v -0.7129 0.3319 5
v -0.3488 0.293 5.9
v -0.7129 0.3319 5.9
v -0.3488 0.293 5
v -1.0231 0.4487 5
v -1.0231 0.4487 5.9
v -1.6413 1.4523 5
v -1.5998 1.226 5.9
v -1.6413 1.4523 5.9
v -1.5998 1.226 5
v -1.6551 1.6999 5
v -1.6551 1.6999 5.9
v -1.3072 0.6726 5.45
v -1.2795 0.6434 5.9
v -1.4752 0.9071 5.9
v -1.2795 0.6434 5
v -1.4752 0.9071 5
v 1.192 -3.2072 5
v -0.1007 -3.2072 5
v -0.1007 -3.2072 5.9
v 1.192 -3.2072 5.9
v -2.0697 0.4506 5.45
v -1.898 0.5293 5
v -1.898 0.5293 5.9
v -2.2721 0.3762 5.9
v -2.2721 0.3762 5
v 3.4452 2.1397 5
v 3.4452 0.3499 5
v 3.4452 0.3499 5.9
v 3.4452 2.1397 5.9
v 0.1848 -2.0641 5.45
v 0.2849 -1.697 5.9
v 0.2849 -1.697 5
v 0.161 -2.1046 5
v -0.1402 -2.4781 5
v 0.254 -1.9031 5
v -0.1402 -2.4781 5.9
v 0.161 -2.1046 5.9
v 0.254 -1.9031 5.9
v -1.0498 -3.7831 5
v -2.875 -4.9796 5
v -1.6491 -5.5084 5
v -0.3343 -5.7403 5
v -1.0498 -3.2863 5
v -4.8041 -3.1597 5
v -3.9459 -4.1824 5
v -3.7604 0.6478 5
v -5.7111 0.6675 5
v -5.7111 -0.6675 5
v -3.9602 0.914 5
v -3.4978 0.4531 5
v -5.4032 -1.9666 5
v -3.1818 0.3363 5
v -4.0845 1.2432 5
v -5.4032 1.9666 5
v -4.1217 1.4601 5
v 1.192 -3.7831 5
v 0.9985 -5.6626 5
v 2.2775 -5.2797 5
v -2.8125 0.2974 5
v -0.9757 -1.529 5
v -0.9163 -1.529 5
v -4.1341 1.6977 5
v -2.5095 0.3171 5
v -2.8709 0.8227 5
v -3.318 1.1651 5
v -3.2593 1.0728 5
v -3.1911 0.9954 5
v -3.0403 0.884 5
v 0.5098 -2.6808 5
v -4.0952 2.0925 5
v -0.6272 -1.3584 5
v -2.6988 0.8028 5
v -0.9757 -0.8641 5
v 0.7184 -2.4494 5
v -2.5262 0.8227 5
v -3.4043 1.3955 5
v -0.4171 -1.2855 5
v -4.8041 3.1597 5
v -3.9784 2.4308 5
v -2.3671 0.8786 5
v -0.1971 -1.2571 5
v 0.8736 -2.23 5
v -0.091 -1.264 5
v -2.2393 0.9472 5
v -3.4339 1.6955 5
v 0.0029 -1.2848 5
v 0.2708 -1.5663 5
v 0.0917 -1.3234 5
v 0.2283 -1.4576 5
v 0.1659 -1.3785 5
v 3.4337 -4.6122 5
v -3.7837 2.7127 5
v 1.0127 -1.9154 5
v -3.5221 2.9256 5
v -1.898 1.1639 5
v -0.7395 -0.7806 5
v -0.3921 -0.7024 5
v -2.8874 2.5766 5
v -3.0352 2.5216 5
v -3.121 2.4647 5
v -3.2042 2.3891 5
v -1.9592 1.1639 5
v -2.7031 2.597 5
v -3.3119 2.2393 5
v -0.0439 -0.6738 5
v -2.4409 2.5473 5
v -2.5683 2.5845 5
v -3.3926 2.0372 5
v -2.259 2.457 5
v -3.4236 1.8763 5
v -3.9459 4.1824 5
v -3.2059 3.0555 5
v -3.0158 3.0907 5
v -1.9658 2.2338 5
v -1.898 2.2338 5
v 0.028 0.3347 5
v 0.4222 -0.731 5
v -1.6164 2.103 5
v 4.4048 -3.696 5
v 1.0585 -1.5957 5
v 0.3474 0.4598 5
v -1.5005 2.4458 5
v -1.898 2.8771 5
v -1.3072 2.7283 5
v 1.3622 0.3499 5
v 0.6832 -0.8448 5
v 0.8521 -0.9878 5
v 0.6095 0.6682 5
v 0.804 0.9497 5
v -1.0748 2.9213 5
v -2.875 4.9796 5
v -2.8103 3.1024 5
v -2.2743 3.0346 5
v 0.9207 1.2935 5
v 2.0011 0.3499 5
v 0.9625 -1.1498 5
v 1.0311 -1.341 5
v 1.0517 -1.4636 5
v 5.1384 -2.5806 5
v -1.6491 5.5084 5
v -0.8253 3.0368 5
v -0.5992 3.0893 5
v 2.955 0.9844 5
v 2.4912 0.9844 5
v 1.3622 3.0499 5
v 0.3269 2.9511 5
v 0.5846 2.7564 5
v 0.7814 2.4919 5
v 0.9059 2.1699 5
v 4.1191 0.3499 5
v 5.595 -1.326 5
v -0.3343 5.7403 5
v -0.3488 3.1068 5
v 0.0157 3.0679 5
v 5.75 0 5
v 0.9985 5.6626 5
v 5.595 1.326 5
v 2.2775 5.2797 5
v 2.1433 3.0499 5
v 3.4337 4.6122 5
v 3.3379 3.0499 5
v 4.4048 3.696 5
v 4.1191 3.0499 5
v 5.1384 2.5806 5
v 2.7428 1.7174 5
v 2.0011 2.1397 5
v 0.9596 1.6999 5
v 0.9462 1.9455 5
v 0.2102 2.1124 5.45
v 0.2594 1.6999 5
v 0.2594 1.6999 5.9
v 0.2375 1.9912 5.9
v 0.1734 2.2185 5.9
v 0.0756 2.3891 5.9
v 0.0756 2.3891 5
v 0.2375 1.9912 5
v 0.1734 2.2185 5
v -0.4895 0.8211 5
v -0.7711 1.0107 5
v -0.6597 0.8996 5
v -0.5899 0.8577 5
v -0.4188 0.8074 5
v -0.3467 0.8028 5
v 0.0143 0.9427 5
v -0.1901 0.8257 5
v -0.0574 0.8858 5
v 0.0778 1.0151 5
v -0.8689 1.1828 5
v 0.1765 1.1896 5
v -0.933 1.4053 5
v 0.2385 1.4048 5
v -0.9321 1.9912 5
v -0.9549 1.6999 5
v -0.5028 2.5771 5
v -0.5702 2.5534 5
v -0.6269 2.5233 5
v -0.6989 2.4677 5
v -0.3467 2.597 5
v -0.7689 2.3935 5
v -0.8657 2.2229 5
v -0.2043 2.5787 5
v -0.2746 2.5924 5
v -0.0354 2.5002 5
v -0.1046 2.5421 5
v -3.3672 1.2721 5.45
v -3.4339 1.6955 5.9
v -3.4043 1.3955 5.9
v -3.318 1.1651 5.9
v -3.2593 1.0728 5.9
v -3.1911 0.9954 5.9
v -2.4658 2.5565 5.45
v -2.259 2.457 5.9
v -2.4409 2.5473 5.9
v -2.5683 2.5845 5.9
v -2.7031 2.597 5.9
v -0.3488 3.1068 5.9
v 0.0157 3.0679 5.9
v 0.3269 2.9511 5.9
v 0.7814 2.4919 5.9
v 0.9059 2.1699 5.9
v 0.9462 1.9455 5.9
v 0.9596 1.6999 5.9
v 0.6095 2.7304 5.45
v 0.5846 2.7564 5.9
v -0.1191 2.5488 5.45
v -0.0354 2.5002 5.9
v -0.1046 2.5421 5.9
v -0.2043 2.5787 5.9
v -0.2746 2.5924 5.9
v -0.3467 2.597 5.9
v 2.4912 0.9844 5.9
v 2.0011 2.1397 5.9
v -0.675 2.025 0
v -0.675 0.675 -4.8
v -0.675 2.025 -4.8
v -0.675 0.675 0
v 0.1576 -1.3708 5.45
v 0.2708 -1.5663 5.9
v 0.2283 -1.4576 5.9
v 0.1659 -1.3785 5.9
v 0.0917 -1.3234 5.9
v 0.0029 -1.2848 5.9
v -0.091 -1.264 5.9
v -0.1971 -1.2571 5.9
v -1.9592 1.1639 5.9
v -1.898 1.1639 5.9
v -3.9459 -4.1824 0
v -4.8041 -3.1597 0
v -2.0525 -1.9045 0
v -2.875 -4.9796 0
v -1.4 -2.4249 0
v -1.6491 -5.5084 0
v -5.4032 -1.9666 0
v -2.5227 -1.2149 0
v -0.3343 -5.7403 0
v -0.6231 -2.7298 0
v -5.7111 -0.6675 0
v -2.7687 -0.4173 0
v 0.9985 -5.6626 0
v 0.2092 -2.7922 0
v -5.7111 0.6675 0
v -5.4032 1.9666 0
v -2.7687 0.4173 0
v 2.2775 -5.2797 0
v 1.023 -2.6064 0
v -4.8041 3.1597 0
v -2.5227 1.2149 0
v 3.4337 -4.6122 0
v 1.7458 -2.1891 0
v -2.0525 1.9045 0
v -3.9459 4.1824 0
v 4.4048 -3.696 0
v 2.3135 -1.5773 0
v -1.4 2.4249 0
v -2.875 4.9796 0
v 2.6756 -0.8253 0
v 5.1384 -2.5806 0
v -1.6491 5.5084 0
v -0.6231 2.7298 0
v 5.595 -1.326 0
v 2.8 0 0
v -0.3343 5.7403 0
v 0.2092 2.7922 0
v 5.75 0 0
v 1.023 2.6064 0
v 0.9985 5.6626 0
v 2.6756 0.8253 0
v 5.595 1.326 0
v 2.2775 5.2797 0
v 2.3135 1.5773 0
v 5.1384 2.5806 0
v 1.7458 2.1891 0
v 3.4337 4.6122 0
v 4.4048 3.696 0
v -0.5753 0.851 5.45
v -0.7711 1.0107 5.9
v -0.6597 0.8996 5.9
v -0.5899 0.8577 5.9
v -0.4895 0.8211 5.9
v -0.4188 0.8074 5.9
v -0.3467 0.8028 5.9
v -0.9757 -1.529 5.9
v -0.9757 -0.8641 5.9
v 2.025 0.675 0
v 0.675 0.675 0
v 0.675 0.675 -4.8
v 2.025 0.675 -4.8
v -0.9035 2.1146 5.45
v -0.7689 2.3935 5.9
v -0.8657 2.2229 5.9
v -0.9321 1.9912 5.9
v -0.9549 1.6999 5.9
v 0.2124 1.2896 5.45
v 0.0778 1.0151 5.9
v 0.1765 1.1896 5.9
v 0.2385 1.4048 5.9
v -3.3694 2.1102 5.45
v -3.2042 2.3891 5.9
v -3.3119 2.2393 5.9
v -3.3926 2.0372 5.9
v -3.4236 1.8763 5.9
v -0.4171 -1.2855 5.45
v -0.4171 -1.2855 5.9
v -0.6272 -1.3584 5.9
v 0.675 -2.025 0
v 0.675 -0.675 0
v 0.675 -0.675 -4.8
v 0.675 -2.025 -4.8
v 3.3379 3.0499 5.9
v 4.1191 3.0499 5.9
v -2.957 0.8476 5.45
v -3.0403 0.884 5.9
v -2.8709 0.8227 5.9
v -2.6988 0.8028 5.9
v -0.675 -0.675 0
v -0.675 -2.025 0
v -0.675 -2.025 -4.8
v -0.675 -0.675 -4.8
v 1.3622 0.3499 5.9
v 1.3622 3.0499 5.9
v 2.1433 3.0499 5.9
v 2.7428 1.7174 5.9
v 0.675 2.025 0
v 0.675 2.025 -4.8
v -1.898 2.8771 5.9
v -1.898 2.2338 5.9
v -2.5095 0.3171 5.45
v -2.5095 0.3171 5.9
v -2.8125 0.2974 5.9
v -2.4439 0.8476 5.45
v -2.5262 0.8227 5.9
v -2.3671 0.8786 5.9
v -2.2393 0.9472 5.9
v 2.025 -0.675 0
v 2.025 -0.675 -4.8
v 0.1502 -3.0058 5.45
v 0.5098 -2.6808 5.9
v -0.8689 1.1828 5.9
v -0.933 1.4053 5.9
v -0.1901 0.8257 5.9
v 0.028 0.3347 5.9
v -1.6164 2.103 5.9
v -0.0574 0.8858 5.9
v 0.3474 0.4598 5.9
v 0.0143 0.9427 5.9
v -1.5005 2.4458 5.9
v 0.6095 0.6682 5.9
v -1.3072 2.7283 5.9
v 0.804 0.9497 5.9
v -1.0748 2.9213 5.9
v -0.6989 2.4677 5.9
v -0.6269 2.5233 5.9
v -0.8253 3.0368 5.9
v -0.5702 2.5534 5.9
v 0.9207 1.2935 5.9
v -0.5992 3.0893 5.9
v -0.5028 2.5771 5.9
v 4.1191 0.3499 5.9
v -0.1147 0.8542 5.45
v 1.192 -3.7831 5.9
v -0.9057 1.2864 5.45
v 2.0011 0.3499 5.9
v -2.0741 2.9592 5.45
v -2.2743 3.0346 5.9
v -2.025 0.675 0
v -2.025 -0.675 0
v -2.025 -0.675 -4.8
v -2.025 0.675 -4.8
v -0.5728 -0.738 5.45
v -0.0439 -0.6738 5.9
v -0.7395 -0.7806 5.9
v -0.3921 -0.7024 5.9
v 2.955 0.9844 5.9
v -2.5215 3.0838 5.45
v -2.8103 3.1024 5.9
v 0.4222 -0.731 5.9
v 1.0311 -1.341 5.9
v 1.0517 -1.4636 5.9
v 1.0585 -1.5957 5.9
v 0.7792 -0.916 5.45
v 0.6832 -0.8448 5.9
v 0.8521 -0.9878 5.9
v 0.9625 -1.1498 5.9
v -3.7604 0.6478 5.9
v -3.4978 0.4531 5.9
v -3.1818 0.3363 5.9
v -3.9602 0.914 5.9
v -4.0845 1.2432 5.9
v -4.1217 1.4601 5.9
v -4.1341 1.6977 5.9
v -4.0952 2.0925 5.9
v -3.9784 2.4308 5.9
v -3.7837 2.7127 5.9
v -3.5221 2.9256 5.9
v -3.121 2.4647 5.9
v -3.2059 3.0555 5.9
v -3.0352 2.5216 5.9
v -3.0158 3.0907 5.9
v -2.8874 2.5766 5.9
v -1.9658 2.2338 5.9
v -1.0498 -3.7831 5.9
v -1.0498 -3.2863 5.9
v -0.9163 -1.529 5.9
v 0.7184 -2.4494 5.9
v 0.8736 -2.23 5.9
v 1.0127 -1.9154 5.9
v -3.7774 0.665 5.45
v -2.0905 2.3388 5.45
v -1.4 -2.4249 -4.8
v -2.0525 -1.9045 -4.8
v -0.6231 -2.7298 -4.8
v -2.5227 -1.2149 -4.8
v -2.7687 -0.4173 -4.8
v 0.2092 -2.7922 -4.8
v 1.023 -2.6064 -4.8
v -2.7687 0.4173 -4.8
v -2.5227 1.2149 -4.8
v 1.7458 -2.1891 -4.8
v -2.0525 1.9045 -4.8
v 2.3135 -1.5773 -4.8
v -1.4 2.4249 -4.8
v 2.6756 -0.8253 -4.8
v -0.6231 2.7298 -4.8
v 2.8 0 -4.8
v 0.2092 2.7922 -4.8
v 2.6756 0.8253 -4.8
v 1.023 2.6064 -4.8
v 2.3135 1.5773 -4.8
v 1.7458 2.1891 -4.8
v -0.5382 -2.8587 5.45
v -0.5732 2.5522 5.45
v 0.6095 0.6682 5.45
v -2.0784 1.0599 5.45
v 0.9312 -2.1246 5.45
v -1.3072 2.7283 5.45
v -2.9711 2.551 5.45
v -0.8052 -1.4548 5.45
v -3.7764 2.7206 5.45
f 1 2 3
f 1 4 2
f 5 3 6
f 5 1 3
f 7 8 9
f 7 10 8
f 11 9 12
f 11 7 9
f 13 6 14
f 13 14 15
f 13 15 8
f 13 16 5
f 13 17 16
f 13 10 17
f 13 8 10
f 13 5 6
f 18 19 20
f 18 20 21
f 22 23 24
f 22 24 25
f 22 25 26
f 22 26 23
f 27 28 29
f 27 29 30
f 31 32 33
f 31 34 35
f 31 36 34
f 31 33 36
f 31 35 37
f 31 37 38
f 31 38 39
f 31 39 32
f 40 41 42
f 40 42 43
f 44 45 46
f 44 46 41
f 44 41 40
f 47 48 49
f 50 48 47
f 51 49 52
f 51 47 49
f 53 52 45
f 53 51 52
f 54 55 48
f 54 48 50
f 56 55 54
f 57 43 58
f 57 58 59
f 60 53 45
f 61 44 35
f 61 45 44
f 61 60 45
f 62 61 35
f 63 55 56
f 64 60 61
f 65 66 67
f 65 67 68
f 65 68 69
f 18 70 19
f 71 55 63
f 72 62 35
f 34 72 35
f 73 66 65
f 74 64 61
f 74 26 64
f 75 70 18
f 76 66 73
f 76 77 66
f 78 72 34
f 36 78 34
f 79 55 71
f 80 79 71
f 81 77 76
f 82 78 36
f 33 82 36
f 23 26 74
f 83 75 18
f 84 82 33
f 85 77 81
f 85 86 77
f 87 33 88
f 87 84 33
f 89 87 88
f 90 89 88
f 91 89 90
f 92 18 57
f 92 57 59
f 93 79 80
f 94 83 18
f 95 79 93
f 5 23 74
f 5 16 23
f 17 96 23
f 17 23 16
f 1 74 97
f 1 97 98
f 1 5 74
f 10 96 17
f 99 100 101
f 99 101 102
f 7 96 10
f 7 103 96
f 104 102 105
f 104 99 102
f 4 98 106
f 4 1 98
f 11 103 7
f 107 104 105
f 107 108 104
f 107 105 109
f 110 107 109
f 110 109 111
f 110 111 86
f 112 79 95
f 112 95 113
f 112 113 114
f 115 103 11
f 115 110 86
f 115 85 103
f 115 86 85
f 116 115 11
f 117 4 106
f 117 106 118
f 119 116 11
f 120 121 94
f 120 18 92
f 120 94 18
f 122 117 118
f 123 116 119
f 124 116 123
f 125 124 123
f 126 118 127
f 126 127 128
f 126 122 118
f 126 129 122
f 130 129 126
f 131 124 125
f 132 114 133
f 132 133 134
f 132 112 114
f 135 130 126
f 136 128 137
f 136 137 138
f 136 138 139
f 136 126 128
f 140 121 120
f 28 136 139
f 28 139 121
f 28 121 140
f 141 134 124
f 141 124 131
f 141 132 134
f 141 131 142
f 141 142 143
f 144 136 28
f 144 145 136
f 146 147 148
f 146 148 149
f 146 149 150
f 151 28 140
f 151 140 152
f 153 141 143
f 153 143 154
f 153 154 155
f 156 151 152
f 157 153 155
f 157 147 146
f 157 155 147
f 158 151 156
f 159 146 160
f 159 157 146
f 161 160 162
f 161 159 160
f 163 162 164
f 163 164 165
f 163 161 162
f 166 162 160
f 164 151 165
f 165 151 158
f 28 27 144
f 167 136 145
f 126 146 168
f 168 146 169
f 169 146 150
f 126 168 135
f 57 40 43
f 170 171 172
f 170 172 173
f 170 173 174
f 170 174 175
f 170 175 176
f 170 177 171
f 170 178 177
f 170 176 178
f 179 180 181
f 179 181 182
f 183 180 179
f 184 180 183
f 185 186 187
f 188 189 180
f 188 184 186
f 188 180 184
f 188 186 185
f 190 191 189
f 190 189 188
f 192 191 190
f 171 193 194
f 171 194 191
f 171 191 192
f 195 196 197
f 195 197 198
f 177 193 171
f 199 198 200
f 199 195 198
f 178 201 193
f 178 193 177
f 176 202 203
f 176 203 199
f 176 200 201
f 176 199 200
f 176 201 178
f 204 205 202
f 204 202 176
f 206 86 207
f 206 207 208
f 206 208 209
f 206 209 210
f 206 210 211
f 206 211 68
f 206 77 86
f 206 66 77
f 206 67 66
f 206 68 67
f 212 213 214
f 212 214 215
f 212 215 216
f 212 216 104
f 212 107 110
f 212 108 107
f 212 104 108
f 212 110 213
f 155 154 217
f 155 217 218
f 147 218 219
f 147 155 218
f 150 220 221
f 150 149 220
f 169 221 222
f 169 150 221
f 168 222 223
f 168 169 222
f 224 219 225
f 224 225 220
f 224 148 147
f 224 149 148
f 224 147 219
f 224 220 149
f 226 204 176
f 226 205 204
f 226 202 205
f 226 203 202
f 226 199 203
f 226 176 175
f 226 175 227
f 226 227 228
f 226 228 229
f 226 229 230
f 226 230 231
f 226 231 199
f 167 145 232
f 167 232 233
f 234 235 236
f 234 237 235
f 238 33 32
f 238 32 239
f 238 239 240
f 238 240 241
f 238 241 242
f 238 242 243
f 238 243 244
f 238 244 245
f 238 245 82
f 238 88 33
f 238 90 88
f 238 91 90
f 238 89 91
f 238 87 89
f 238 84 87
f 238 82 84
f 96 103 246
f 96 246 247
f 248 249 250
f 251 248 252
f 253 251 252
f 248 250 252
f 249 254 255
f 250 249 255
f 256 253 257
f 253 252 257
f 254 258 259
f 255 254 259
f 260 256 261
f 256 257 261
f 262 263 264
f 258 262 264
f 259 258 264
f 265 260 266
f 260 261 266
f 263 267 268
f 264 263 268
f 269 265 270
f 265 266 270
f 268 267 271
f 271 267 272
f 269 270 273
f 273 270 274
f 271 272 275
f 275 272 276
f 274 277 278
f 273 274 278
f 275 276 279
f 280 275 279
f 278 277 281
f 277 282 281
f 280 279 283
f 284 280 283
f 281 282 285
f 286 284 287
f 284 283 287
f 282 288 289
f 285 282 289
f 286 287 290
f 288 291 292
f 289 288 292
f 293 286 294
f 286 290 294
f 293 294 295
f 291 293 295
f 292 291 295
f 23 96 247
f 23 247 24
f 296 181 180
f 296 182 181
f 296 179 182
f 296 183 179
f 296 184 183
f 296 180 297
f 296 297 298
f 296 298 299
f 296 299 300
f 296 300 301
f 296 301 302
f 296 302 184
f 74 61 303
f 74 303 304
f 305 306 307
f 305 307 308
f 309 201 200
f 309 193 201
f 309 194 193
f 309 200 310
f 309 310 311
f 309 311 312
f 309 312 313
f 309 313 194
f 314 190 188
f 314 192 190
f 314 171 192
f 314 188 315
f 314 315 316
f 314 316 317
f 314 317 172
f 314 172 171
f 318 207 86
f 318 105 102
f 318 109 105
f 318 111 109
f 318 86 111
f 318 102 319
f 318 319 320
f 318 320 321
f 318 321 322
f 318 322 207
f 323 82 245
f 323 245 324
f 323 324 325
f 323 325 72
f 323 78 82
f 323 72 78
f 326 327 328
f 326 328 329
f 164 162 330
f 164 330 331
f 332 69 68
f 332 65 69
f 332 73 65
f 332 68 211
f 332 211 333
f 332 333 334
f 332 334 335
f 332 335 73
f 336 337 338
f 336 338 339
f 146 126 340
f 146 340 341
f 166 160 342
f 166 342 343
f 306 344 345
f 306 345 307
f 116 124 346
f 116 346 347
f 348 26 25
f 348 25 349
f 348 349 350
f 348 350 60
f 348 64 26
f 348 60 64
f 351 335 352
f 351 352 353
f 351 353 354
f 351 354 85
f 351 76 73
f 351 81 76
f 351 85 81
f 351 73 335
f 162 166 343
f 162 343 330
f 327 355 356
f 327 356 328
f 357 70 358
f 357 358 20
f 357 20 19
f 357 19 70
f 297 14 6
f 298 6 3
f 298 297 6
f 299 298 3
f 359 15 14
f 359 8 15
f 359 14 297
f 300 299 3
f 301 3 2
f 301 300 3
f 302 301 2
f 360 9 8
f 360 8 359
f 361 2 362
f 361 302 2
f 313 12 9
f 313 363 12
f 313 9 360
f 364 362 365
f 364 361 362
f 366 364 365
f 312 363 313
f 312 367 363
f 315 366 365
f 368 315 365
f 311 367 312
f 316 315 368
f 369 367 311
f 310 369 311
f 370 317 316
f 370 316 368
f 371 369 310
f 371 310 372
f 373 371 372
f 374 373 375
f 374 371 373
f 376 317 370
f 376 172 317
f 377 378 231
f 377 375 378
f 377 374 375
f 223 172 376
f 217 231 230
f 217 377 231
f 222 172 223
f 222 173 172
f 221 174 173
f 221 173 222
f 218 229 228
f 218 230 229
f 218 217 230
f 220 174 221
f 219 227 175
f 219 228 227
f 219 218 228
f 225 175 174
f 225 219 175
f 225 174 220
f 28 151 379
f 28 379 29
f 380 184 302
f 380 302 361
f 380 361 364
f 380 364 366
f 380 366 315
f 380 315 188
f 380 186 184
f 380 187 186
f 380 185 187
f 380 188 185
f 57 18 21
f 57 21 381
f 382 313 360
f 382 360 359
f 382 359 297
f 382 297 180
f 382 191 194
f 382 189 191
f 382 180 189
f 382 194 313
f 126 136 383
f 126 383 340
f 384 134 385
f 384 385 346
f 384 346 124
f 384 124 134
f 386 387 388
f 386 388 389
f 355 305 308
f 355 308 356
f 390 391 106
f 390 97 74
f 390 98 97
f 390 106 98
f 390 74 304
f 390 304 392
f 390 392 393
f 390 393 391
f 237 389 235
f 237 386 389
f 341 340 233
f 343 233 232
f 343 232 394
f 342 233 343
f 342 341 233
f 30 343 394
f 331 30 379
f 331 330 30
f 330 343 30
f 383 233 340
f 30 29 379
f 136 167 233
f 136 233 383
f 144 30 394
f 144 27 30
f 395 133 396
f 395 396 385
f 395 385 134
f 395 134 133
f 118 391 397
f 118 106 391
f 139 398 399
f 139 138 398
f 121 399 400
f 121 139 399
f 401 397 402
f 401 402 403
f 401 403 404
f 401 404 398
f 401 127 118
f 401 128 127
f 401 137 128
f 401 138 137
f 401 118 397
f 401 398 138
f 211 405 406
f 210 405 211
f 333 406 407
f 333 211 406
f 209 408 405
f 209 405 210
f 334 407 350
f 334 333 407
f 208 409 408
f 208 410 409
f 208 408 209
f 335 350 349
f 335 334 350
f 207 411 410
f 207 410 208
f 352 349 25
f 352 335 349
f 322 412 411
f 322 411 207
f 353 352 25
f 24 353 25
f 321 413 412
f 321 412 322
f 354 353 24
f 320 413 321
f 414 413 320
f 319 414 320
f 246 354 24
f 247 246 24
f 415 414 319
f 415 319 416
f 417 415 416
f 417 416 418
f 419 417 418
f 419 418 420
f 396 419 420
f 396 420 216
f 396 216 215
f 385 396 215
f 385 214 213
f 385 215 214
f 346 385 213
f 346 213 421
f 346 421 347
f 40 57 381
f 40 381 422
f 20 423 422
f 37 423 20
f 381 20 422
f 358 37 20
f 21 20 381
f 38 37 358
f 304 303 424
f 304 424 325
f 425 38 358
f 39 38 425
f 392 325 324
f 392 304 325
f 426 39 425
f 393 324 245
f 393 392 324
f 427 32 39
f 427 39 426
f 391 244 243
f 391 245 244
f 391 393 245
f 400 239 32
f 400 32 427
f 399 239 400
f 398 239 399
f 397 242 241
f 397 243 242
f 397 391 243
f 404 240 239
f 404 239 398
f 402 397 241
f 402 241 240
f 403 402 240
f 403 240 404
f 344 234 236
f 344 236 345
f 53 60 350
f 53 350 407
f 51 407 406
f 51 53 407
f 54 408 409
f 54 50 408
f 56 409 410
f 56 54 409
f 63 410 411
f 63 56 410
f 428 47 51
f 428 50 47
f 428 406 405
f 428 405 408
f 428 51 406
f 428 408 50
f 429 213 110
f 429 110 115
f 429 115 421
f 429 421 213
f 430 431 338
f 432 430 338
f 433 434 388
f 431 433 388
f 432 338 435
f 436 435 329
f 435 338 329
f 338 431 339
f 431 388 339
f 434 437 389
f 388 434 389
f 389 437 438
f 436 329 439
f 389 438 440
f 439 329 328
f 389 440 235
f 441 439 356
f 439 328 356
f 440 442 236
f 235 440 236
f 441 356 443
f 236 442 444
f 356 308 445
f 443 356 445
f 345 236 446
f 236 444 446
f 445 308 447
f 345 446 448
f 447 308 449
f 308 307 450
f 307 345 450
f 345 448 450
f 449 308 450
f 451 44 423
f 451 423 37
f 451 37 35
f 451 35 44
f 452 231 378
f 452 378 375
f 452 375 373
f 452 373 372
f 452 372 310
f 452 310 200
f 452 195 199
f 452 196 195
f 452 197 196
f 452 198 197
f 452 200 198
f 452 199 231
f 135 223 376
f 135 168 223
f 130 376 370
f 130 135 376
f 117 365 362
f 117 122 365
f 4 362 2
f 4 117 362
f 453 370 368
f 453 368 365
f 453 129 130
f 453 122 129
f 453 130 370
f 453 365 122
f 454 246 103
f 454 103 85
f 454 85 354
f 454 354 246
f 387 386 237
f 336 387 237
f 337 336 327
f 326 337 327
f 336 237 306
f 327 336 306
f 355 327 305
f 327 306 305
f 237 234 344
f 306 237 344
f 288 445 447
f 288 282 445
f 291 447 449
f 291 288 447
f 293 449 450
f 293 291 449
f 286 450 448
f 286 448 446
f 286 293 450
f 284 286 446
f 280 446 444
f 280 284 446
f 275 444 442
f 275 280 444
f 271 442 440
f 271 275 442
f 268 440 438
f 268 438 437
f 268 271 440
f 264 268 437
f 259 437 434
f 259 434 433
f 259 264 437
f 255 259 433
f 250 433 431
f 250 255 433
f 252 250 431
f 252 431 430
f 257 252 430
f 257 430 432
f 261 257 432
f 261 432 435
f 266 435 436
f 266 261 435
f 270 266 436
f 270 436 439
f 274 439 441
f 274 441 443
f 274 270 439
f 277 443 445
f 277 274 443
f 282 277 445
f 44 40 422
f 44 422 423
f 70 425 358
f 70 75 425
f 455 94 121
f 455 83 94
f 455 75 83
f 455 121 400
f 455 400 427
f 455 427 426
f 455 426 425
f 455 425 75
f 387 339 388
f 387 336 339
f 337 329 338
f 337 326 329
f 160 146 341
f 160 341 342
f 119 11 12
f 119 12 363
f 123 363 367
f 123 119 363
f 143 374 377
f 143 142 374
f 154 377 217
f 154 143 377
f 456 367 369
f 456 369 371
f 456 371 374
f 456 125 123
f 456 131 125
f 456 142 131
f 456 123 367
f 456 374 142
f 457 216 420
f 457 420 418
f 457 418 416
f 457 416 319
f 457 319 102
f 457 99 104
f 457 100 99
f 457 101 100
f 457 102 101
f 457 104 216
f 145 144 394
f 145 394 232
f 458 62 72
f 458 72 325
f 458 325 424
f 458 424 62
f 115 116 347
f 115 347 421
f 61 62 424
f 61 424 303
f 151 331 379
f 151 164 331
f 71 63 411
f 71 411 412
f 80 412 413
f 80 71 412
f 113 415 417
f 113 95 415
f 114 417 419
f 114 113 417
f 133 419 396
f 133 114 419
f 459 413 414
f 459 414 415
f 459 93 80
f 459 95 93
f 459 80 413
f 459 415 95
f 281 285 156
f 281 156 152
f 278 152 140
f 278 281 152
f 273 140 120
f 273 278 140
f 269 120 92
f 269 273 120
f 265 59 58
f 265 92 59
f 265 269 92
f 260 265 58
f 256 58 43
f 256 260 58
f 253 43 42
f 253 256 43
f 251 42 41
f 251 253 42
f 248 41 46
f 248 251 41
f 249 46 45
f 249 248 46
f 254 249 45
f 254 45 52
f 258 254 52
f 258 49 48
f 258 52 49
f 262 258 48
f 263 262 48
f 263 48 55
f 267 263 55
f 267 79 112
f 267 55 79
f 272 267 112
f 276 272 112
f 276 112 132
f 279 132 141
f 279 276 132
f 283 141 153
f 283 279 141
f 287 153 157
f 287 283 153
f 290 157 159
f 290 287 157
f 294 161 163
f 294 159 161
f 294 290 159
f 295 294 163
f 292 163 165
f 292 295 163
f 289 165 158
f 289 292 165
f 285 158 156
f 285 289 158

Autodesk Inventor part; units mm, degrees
ref_plane "YZ Plane" through (0, 0, 0) normal (1, 0, 0) x (0, 1, 0)
ref_plane "XZ Plane" through (0, 0, 0) normal (0, 1, 0) x (-1, 0, 0)
ref_plane "XY Plane" through (0, 0, 0) normal (0, 0, 1) x (1, 0, 0)
sketch "Sketch1" plane through (0, 0, 0) normal (0, 0, 1) x (1, 0, 0)
  circle A0 centre (0, 0) radius 6.22 construction
  circle A1 centre (0, 0) radius 2.8
  line L0 (-0.675, 0.675) -> (-0.675, 2.025)
  line L1 (-0.675, 2.025) -> (0.675, 2.025)
  line L2 (0.675, 2.025) -> (0.675, 0.675)
  line L3 (0.675, 0.675) -> (2.025, 0.675)
  line L4 (2.025, 0.675) -> (2.025, -0.675)
  line L5 (2.025, -0.675) -> (0.675, -0.675)
  line L6 (0.675, -0.675) -> (0.675, -2.025)
  line L7 (0.675, -2.025) -> (-0.675, -2.025)
  line L8 (-0.675, -2.025) -> (-0.675, -0.675)
  line L9 (-0.675, -0.675) -> (-2.025, -0.675)
  line L10 (-2.025, -0.675) -> (-2.025, 0.675)
  line L11 (-2.025, 0.675) -> (-0.675, 0.675)
  circle A2 centre (0, 0) radius 5.75
  point P0 (-6.07, -6.1)
  dimension "d0" = 12.44
  dimension "d1" = 0.47
extrude "Extrusion1" add sketch "Sketch1" along normal blind 5 contours A1 | L0 L1 L2 L3 L4 L5 L6 L7 L8 L9 L10 L11 | A2
extrude "Extrusion2" add sketch "Sketch1" against normal blind 4.8 contours A1
sketch "Sketch2" plane through (0, 0, 5) normal (0, 0, 1) x (1, 0, 0)
  point P0 (0, 0)
sketch "Sketch3" plane through (0, 0, 5) normal (0, 0, 1) x (1, 0, 0)
  line L0 (-4.2566, 3.1068) -> (4.2414, 3.1068) construction
  line L1 (4.2414, 3.1068) -> (4.2414, 0.2437) construction
  line L2 (4.2414, 0.2437) -> (-4.2566, 0.2437) construction
  line L3 (-4.2566, 0.2437) -> (-4.2566, 3.1068) construction
  line L4 (-1.3588, -0.6738) -> (1.3131, -0.6738) construction
  line L5 (1.3131, -0.6738) -> (1.3131, -3.7312) construction
  line L6 (1.3131, -3.7312) -> (-1.3588, -3.7312) construction
  line L7 (-1.3588, -3.7312) -> (-1.3588, -0.6738) construction
  spline S0 degree 2 poles (-2.8125, 0.2974) (-3.4208, 0.2974) (-4.1341, 1.0326) (-4.1341, 1.6977) knots 0 0 0 1 2 2 2
  spline S1 degree 2 poles (-4.1341, 1.6977) (-4.1341, 2.3388) (-3.4186, 3.1024) (-2.8103, 3.1024) knots 0 0 0 1 2 2 2
  spline S2 degree 2 poles (-2.8103, 3.1024) (-2.6506, 3.1024) (-2.3924, 3.0652) (-2.2743, 3.0346) knots 0 0 0 1 2 2 2
  spline S3 degree 2 poles (-2.2743, 3.0346) (-2.1824, 3.0062) (-1.9658, 2.9121) (-1.898, 2.8771) knots 0 0 0 1 2 2 2
  line L8 (-1.898, 2.8771) -> (-1.898, 2.2338)
  line L9 (-1.898, 2.2338) -> (-1.9658, 2.2338)
  spline S4 degree 2 poles (-1.9658, 2.2338) (-2.0161, 2.2775) (-2.1649, 2.4001) (-2.259, 2.457) knots 0 0 0 1 2 2 2
  spline S5 degree 2 poles (-2.259, 2.457) (-2.3531, 2.516) (-2.5784, 2.597) (-2.7031, 2.597) knots 0 0 0 1 2 2 2
  spline S6 degree 2 poles (-2.7031, 2.597) (-2.8497, 2.597) (-3.0926, 2.5051) (-3.2042, 2.3891) knots 0 0 0 1 2 2 2
  spline S7 degree 2 poles (-3.2042, 2.3891) (-3.3048, 2.2863) (-3.4339, 1.934) (-3.4339, 1.6955) knots 0 0 0 1 2 2 2
  spline S8 degree 2 poles (-3.4339, 1.6955) (-3.4339, 1.4439) (-3.3005, 1.1004) (-3.1911, 0.9954) knots 0 0 0 1 2 2 2
  spline S9 degree 2 poles (-3.1911, 0.9954) (-3.086, 0.8925) (-2.8279, 0.8028) (-2.6988, 0.8028) knots 0 0 0 1 2 2 2
  spline S10 degree 2 poles (-2.6988, 0.8028) (-2.5653, 0.8028) (-2.3224, 0.8925) (-2.2393, 0.9472) knots 0 0 0 1 2 2 2
  spline S11 degree 2 poles (-2.2393, 0.9472) (-2.1474, 1.0019) (-2.0095, 1.1179) (-1.9592, 1.1639) knots 0 0 0 1 2 2 2
  line L10 (-1.9592, 1.1639) -> (-1.898, 1.1639)
  line L11 (-1.898, 1.1639) -> (-1.898, 0.5293)
  spline S12 degree 2 poles (-1.898, 0.5293) (-1.9723, 0.4943) (-2.1671, 0.4068) (-2.2721, 0.3762) knots 0 0 0 1 2 2 2
  spline S13 degree 2 poles (-2.2721, 0.3762) (-2.399, 0.3368) (-2.62, 0.2974) (-2.8125, 0.2974) knots 0 0 0 1 2 2 2
  spline S14 degree 2 poles (0.9596, 1.6999) (0.9596, 1.0435) (0.2594, 0.293) (-0.3488, 0.293) knots 0 0 0 1 2 2 2
  spline S15 degree 2 poles (-0.3488, 0.293) (-0.9593, 0.293) (-1.6551, 1.0523) (-1.6551, 1.6999) knots 0 0 0 1 2 2 2
  spline S16 degree 2 poles (-1.6551, 1.6999) (-1.6551, 2.3498) (-0.9593, 3.1068) (-0.3488, 3.1068) knots 0 0 0 1 2 2 2
  spline S17 degree 2 poles (-0.3488, 3.1068) (0.2594, 3.1068) (0.9596, 2.3541) (0.9596, 1.6999) knots 0 0 0 1 2 2 2
  spline S18 degree 2 poles (0.2594, 1.6999) (0.2594, 1.9428) (0.161, 2.2819) (0.0756, 2.3891) knots 0 0 0 1 2 2 2
  spline S19 degree 2 poles (0.0756, 2.3891) (-0.0097, 2.5007) (-0.2285, 2.597) (-0.3467, 2.597) knots 0 0 0 1 2 2 2
  spline S20 degree 2 poles (-0.3467, 2.597) (-0.4714, 2.597) (-0.6749, 2.5073) (-0.7689, 2.3935) knots 0 0 0 1 2 2 2
  spline S21 degree 2 poles (-0.7689, 2.3935) (-0.8521, 2.2885) (-0.9549, 1.9406) (-0.9549, 1.6999) knots 0 0 0 1 2 2 2
  spline S22 degree 2 poles (-0.9549, 1.6999) (-0.9549, 1.4505) (-0.8565, 1.1223) (-0.7711, 1.0107) knots 0 0 0 1 2 2 2
  spline S23 degree 2 poles (-0.7711, 1.0107) (-0.6858, 0.8991) (-0.4648, 0.8028) (-0.3467, 0.8028) knots 0 0 0 1 2 2 2
  spline S24 degree 2 poles (-0.3467, 0.8028) (-0.2263, 0.8028) (-0.0031, 0.9057) (0.0778, 1.0151) knots 0 0 0 1 2 2 2
  spline S25 degree 2 poles (0.0778, 1.0151) (0.1653, 1.1332) (0.2594, 1.4461) (0.2594, 1.6999) knots 0 0 0 1 2 2 2
  line L12 (4.1191, 0.3499) -> (3.4452, 0.3499)
  line L13 (3.4452, 0.3499) -> (3.4452, 2.1397)
  line L14 (3.4452, 2.1397) -> (2.955, 0.9844)
  line L15 (2.955, 0.9844) -> (2.4912, 0.9844)
  line L16 (2.4912, 0.9844) -> (2.0011, 2.1397)
  line L17 (2.0011, 2.1397) -> (2.0011, 0.3499)
  line L18 (2.0011, 0.3499) -> (1.3622, 0.3499)
  line L19 (1.3622, 0.3499) -> (1.3622, 3.0499)
  line L20 (1.3622, 3.0499) -> (2.1433, 3.0499)
  line L21 (2.1433, 3.0499) -> (2.7428, 1.7174)
  line L22 (2.7428, 1.7174) -> (3.3379, 3.0499)
  line L23 (3.3379, 3.0499) -> (4.1191, 3.0499)
  line L24 (4.1191, 3.0499) -> (4.1191, 0.3499)
  line L25 (1.192, -3.7831) -> (-1.0498, -3.7831)
  line L26 (-1.0498, -3.7831) -> (-1.0498, -3.2863)
  spline S26 degree 2 poles (-1.0498, -3.2863) (-0.7656, -3.0589) (-0.3108, -2.6585) (-0.1402, -2.4781) knots 0 0 0 1 2 2 2
  spline S27 degree 2 poles (-0.1402, -2.4781) (0.0847, -2.2433) (0.2849, -1.8849) (0.2849, -1.697) knots 0 0 0 1 2 2 2
  spline S28 degree 2 poles (0.2849, -1.697) (0.2849, -1.4845) (0.0303, -1.2571) (-0.1971, -1.2571) knots 0 0 0 1 2 2 2
  spline S29 degree 2 poles (-0.1971, -1.2571) (-0.3133, -1.2571) (-0.5209, -1.3139) (-0.6272, -1.3584) knots 0 0 0 1 2 2 2
  spline S30 degree 2 poles (-0.6272, -1.3584) (-0.731, -1.4054) (-0.8793, -1.5043) (-0.9163, -1.529) knots 0 0 0 1 2 2 2
  line L27 (-0.9163, -1.529) -> (-0.9757, -1.529)
  line L28 (-0.9757, -1.529) -> (-0.9757, -0.8641)
  spline S31 degree 2 poles (-0.9757, -0.8641) (-0.8471, -0.8023) (-0.2984, -0.6738) (-0.0439, -0.6738) knots 0 0 0 1 2 2 2
  spline S32 degree 2 poles (-0.0439, -0.6738) (0.4999, -0.6738) (1.0585, -1.1582) (1.0585, -1.5957) knots 0 0 0 1 2 2 2
  spline S33 degree 2 poles (1.0585, -1.5957) (1.0585, -1.8651) (0.8039, -2.3842) (0.5098, -2.6808) knots 0 0 0 1 2 2 2
  spline S34 degree 2 poles (0.5098, -2.6808) (0.3244, -2.8637) (-0.0241, -3.1479) (-0.1007, -3.2072) knots 0 0 0 1 2 2 2
  line L29 (-0.1007, -3.2072) -> (1.192, -3.2072)
  line L30 (1.192, -3.2072) -> (1.192, -3.7831)
  point P0 (0, 0)
  point P1 (-0.0076, 0.2437)
  point P2 (-0.0228, -3.7312)
extrude "Extrusion3" add sketch "Sketch3" along normal blind 0.9
properties part number "IPC Com 2 key"
